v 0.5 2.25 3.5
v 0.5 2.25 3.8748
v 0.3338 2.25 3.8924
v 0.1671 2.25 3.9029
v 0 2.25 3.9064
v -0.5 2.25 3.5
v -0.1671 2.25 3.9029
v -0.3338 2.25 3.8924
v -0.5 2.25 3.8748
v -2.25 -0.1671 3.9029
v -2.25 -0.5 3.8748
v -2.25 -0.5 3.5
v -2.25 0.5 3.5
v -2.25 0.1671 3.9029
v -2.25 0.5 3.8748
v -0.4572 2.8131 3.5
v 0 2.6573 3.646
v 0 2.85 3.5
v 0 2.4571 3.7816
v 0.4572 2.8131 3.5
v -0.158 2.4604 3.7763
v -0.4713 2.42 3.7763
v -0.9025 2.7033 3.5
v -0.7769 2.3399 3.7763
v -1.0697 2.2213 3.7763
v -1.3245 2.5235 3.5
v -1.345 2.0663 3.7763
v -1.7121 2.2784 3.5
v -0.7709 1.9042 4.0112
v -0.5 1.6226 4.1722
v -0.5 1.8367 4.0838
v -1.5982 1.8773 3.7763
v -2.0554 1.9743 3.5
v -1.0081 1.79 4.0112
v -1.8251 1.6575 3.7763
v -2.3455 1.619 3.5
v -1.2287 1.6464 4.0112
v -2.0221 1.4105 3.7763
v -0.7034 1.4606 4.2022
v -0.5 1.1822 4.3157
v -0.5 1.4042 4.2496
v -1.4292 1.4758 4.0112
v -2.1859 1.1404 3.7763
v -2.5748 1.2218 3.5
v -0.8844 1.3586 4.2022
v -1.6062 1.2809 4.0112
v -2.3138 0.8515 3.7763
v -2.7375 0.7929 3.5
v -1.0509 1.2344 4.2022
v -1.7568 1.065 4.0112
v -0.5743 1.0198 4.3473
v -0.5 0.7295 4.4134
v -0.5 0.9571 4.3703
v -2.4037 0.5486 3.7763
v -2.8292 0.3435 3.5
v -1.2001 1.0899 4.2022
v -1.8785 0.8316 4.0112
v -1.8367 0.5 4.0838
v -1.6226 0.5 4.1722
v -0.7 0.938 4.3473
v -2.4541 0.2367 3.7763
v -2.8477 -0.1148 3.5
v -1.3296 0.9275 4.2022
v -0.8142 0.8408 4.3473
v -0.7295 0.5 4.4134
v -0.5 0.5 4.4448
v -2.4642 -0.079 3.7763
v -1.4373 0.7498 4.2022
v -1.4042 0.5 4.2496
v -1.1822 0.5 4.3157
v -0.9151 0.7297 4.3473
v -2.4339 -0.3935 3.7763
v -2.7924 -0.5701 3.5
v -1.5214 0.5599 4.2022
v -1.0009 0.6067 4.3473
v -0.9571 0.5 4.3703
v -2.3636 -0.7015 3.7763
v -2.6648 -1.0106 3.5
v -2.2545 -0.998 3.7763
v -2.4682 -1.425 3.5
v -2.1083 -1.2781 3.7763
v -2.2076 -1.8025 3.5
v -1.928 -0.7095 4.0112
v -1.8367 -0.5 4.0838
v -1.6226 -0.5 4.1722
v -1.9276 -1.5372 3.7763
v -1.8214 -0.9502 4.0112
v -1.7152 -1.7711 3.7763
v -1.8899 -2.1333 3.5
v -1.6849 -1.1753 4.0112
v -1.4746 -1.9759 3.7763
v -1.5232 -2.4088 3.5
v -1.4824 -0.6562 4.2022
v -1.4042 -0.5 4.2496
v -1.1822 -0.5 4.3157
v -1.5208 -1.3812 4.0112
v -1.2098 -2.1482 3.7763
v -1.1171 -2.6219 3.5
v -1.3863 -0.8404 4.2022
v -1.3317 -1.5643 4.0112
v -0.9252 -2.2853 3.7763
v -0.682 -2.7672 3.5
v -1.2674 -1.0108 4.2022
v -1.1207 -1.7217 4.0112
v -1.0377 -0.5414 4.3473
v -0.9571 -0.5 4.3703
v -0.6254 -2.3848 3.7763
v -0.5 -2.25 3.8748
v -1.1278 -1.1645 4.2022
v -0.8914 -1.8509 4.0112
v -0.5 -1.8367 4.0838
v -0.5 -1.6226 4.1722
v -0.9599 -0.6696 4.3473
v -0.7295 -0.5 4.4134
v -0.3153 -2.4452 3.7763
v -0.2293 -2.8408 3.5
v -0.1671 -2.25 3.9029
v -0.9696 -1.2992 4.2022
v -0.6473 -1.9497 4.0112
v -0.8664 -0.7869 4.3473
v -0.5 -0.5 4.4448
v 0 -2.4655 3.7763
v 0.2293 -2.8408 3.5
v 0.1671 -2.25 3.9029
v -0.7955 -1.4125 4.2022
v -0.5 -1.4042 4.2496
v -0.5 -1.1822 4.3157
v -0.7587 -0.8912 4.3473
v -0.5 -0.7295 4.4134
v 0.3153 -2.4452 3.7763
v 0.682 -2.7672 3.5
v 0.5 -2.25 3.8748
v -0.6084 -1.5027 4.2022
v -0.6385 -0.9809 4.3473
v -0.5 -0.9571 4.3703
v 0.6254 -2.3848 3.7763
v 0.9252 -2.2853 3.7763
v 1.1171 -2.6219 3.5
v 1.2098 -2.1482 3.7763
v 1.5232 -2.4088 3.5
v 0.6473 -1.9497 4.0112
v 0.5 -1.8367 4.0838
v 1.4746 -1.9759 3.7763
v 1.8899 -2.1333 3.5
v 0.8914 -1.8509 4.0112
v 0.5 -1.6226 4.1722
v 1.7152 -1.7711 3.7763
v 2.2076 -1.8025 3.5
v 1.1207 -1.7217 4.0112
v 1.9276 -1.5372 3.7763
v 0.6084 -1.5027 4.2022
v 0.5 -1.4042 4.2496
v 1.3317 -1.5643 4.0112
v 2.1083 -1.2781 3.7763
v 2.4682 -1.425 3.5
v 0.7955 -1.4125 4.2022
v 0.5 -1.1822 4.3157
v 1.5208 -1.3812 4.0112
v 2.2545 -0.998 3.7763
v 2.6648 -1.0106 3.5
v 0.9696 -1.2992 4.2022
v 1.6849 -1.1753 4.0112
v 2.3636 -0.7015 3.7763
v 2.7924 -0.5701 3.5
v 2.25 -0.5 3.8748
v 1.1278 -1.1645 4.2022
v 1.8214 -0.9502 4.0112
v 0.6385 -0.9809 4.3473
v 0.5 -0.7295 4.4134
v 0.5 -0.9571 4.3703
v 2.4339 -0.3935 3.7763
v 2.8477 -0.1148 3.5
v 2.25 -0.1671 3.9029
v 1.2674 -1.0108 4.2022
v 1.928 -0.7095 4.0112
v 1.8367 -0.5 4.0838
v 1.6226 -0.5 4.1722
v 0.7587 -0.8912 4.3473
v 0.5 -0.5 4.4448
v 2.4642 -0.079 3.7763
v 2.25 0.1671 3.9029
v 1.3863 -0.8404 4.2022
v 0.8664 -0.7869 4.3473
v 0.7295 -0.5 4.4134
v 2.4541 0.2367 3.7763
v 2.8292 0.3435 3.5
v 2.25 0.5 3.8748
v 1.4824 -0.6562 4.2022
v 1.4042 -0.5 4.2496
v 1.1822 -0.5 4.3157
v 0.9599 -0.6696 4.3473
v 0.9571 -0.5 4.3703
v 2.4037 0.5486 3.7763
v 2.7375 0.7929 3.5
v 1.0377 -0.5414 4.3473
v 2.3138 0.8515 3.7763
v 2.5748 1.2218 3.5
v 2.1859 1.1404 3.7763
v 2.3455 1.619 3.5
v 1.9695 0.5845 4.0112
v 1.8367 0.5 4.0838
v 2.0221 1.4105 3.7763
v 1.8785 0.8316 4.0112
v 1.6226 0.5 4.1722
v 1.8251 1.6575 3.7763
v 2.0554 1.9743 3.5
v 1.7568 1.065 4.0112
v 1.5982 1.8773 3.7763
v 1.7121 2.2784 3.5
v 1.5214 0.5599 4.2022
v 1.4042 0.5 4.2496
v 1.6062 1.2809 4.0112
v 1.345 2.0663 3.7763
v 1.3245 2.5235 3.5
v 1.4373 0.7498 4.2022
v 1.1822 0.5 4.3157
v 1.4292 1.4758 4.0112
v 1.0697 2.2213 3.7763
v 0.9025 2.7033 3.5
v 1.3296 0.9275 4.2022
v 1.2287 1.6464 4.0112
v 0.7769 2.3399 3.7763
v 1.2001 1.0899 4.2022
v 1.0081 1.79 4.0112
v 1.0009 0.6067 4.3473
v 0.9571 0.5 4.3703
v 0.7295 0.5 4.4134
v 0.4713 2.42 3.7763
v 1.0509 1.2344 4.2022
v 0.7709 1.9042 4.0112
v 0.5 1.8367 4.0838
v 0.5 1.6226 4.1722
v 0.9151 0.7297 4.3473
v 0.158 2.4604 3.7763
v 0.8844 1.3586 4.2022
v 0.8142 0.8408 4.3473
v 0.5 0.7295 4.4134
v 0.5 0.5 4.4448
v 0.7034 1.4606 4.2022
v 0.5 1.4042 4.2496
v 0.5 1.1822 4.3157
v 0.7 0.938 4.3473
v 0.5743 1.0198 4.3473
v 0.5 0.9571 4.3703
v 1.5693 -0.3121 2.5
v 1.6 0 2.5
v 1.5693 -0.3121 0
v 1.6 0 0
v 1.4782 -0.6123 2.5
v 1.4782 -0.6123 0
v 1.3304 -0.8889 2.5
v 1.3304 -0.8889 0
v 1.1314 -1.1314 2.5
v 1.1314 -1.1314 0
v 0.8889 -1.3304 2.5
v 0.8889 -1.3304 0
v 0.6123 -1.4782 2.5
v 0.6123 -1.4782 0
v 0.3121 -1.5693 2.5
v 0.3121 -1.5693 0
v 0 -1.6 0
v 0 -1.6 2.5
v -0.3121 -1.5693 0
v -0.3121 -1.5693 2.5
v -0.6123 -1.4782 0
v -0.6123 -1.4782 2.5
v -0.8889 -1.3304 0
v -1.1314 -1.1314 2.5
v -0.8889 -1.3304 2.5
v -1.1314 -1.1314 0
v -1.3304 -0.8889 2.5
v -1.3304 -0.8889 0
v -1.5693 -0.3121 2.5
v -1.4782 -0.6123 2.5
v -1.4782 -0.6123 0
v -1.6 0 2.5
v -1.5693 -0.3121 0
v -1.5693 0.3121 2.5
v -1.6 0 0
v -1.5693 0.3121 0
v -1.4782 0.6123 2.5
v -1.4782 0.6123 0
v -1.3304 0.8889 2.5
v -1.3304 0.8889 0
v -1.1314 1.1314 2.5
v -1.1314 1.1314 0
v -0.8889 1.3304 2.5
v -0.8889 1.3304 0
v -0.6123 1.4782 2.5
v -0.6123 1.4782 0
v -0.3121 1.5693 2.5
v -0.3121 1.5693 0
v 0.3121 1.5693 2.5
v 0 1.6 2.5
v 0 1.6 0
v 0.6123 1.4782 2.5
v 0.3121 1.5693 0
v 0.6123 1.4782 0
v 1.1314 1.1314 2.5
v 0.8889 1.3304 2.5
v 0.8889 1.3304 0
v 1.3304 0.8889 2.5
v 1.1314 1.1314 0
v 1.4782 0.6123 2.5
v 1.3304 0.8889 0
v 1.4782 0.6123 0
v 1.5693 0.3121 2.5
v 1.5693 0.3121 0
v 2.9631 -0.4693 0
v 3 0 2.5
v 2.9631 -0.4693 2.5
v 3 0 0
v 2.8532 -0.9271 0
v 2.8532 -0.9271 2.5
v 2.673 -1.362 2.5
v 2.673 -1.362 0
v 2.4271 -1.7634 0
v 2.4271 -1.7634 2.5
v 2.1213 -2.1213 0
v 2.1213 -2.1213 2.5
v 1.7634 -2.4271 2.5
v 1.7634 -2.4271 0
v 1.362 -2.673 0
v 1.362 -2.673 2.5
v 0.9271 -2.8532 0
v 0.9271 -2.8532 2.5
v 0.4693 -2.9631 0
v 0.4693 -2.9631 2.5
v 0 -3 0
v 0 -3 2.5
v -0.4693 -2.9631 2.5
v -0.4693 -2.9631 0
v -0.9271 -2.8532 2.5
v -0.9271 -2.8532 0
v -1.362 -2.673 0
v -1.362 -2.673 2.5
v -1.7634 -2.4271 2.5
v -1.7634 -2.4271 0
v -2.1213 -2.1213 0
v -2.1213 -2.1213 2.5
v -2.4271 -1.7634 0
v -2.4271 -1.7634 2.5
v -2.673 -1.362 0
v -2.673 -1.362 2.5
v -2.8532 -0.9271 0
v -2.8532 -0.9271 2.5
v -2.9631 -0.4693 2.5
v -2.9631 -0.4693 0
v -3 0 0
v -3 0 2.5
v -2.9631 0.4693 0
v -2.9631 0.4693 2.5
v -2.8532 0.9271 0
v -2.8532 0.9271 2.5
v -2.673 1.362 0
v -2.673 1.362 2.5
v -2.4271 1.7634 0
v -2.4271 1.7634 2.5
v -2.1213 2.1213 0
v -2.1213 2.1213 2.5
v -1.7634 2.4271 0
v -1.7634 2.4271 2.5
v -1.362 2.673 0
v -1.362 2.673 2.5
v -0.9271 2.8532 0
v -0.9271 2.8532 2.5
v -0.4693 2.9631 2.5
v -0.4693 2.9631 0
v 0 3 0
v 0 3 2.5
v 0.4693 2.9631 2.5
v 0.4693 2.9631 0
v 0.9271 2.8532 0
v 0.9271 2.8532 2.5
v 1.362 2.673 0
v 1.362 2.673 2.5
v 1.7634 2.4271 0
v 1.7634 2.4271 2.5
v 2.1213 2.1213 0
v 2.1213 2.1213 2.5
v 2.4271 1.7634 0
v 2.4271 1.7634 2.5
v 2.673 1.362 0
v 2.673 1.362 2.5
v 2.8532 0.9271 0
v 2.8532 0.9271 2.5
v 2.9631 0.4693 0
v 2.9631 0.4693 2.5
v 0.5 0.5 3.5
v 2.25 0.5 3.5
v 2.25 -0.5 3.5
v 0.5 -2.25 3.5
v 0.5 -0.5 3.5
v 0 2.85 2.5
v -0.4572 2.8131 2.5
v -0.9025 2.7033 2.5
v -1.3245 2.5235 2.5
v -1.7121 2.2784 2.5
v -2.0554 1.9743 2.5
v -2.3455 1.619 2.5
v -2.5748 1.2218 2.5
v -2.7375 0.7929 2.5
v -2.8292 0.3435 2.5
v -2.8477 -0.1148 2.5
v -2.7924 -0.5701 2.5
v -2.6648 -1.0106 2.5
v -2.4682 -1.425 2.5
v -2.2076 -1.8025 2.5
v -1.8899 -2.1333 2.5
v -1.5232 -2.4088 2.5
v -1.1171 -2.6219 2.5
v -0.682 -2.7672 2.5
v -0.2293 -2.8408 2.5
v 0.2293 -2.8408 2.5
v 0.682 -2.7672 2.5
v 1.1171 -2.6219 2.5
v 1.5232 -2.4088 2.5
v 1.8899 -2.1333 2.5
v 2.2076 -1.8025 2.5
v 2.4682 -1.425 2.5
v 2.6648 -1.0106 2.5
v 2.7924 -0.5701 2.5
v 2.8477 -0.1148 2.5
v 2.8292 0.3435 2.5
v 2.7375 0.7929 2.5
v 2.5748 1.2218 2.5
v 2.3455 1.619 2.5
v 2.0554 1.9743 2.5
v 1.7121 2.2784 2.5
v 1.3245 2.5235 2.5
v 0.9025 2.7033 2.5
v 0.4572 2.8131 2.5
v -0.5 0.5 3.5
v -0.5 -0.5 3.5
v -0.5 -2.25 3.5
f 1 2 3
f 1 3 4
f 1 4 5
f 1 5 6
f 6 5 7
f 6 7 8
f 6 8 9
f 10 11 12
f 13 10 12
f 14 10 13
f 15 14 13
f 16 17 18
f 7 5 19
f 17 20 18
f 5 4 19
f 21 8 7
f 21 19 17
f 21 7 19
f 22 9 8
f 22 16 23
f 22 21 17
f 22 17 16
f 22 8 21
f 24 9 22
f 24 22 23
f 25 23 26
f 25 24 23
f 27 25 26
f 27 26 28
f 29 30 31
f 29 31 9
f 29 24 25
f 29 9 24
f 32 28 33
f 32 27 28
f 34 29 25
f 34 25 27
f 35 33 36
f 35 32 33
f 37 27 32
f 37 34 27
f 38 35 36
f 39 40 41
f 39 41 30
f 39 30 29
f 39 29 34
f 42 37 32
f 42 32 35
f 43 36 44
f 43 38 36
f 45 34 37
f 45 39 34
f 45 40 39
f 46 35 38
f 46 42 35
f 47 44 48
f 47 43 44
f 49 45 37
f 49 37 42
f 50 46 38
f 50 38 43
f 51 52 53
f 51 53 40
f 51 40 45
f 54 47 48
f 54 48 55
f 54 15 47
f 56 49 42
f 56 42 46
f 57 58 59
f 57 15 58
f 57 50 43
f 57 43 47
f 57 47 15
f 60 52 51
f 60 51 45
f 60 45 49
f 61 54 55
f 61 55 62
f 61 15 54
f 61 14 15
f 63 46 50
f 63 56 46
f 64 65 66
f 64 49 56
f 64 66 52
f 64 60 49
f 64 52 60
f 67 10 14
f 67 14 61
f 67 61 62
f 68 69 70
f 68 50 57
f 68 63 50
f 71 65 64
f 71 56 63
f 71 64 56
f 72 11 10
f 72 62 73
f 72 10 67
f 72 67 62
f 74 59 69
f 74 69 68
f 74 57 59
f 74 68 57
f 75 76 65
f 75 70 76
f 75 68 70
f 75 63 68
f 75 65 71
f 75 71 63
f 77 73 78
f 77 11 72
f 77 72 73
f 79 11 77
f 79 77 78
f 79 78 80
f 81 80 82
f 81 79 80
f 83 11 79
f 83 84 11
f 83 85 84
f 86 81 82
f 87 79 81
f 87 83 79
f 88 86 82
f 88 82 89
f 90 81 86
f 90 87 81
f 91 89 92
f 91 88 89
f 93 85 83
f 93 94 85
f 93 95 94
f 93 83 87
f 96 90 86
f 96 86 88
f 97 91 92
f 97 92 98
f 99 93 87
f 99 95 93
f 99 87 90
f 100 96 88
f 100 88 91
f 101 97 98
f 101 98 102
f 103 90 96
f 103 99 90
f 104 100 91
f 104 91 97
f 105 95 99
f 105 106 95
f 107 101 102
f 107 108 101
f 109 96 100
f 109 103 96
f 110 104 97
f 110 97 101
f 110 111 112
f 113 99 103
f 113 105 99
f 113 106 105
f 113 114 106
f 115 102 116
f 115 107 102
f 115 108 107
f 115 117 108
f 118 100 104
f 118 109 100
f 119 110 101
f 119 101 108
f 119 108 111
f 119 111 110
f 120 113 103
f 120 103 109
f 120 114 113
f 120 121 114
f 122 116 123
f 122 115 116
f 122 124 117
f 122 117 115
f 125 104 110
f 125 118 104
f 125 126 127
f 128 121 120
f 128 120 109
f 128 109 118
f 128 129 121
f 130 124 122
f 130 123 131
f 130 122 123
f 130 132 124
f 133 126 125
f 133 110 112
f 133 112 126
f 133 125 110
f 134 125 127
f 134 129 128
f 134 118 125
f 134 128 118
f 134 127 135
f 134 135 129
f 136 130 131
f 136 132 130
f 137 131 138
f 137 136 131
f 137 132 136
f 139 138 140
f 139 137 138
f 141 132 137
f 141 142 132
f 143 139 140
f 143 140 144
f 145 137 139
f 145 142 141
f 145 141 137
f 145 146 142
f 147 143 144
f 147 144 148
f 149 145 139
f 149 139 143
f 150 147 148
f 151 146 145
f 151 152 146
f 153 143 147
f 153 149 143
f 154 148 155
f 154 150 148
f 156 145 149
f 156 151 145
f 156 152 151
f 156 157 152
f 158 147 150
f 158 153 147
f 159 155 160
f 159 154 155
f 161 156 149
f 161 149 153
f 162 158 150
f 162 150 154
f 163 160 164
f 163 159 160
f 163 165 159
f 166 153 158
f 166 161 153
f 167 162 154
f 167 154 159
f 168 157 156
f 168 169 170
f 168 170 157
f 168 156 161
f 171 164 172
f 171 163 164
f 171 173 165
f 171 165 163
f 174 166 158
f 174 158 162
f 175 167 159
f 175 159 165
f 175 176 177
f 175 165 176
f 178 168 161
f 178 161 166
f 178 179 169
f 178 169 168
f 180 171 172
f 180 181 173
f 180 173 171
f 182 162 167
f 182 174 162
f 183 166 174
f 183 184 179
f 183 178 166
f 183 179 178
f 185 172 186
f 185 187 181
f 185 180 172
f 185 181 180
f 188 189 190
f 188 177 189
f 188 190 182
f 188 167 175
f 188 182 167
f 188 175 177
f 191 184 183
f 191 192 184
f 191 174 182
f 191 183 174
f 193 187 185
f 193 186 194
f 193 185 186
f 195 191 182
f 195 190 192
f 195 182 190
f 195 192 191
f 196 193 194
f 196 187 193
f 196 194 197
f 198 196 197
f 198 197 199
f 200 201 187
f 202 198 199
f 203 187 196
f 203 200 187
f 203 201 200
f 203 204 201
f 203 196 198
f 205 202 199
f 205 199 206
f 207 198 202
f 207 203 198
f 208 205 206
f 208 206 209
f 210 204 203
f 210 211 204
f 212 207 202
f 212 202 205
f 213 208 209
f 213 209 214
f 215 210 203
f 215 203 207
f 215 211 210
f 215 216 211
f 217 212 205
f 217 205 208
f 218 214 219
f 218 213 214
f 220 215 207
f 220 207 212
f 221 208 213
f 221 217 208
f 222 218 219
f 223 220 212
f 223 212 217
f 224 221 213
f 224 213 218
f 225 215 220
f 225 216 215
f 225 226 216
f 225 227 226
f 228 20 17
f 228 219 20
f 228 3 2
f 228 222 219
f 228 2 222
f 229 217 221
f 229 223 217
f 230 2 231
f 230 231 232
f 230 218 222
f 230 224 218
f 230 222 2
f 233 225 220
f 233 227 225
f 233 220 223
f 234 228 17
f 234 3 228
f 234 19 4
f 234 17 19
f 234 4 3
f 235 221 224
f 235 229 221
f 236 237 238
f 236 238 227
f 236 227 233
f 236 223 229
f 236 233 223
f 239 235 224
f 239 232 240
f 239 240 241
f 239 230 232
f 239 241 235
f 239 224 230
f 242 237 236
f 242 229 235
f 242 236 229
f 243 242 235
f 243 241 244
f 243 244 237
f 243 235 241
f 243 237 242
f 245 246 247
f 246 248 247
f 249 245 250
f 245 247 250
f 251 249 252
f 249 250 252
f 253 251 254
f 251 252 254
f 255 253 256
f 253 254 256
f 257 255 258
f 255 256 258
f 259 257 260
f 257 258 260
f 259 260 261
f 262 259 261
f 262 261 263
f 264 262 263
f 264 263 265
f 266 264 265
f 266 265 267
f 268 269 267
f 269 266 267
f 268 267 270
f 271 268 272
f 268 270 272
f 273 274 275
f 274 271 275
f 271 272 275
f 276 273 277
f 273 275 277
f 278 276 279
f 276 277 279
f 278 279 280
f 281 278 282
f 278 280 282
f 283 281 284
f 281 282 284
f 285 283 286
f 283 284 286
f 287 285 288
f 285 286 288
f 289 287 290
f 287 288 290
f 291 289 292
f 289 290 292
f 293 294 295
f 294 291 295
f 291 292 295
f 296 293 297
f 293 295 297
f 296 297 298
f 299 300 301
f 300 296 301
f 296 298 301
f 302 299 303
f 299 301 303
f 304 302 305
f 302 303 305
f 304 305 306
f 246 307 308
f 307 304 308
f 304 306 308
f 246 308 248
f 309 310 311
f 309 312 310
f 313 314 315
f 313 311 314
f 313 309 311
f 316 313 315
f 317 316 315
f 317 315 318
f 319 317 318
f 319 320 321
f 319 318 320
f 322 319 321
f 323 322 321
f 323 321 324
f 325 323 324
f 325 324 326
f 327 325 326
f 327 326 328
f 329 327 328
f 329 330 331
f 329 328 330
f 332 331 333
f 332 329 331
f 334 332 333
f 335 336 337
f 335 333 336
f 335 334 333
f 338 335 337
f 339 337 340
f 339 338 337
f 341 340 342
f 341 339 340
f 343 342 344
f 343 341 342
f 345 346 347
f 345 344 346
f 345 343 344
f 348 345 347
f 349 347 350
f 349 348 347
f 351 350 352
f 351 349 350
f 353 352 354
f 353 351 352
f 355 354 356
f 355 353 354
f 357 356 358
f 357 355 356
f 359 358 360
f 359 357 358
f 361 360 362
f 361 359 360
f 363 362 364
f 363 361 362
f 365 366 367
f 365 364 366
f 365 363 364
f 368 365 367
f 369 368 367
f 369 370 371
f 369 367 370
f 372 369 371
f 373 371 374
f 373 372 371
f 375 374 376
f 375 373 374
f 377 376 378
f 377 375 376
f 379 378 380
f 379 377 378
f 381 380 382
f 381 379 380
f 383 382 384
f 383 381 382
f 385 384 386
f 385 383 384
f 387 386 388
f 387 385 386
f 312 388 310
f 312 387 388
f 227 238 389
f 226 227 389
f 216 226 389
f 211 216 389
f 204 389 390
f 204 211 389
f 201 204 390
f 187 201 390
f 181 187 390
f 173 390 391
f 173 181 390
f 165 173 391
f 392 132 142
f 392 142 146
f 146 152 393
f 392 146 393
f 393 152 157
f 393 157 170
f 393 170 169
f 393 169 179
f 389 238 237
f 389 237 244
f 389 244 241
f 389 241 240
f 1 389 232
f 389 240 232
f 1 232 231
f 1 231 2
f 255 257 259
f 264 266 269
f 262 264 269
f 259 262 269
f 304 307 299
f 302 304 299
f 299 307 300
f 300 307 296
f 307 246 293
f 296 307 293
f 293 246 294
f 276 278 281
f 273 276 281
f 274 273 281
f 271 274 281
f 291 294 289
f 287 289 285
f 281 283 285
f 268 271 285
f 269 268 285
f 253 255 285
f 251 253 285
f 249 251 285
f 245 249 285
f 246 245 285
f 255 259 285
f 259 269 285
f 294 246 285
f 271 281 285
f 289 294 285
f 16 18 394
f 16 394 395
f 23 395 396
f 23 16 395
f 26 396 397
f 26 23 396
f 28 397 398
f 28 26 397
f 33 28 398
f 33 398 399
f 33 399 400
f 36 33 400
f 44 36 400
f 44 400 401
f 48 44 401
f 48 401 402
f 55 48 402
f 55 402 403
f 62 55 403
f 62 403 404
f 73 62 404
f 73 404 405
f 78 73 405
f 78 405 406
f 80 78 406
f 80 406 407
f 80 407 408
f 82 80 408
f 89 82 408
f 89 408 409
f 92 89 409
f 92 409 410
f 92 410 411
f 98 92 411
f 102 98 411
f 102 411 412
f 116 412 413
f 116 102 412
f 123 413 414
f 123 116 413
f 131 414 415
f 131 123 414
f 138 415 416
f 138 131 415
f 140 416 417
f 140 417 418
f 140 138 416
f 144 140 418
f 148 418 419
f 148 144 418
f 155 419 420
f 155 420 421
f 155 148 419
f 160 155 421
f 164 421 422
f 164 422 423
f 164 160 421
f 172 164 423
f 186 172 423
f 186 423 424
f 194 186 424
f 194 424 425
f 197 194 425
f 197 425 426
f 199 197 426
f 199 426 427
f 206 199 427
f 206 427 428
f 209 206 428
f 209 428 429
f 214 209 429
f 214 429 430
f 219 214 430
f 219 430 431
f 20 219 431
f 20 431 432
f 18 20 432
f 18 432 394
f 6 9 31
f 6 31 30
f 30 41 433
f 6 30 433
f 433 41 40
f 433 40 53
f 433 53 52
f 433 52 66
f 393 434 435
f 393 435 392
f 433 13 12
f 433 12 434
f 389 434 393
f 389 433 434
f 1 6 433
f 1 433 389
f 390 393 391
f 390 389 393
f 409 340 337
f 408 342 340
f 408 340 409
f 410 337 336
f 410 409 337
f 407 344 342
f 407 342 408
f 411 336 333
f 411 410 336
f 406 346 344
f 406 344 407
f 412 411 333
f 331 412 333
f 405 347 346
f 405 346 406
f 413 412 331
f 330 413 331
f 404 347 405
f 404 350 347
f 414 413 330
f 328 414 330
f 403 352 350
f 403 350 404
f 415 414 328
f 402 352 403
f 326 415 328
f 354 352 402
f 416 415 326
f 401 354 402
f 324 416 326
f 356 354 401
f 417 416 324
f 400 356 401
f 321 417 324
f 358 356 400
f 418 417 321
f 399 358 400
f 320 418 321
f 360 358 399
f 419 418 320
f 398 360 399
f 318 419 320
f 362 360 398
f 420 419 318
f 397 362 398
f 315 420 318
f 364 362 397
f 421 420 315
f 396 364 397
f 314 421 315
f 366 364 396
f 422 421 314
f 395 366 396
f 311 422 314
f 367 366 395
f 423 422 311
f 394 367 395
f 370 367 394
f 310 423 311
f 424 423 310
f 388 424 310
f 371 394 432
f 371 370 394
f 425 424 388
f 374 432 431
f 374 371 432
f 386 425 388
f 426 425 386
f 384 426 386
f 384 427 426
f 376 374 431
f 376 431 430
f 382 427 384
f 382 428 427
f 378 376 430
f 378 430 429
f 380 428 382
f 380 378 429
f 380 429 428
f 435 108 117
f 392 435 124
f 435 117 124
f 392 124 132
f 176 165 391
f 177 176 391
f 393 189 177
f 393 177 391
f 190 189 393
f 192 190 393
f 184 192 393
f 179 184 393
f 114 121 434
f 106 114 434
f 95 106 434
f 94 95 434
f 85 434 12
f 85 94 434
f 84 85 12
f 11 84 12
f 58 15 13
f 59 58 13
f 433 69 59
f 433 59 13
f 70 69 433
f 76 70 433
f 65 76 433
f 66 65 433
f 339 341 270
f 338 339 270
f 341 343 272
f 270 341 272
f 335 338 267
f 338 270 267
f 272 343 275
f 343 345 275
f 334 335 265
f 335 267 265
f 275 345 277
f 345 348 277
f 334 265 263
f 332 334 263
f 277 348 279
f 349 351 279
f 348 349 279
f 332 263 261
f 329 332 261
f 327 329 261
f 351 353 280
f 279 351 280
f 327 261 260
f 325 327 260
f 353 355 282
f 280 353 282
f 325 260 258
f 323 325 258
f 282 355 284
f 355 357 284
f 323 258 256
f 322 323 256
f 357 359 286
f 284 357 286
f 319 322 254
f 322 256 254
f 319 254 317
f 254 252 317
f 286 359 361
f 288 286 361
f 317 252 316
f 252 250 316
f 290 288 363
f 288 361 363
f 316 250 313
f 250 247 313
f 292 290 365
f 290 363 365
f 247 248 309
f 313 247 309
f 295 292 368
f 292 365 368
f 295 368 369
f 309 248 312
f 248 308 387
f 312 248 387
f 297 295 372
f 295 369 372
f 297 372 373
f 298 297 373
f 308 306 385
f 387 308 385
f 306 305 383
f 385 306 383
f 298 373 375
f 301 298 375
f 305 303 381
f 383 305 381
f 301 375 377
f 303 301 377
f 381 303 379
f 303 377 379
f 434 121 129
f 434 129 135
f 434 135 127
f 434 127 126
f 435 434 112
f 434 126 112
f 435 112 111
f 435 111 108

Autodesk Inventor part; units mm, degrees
ref_plane "YZ Plane" through (0, 0, 0) normal (1, 0, 0) x (0, 1, 0)
ref_plane "XZ Plane" through (0, 0, 0) normal (0, 1, 0) x (-1, 0, 0)
sketch "スケッチ1" plane through (0, 0, 0) normal (0, 0, 1) x (1, 0, 0)
  circle A0 centre (0, 0) radius 1.6
  circle A1 centre (0, 0) radius 3
  dimension "d0" = 3.2
  dimension "d1" = 6
extrude "押し出し1" add sketch "スケッチ1" along normal blind 2.5
sketch "スケッチ2" plane through (0, 0, 0) normal (1, 0, 0) x (0, 1, 0)
  arc A0 (2.85, 3.5) -> (-2.85, 3.5) centre (0, -0.0613) ccw
  line L0 (2.85, 3.5) -> (-2.85, 3.5)
  line L1 (-2.85, 3.5) -> (-2.85, 2.5)
  line L2 (-2.85, 2.5) -> (2.85, 2.5)
  line L3 (2.85, 2.5) -> (2.85, 3.5)
  line L4 (3, 2.5) -> (-3, 2.5) projected
  line L5 (10, 4.5) -> (-10, 4.5)
  line L6 (0, 2.5) -> (0, 4.5)
  point P0 (0, 0)
  point P1 (0, 4.5)
  dimension "d4" = 1
  dimension "d5" = 1
  dimension "d7" = 5.7
revolve "回転1" add sketch "スケッチ2" angle 360 about axis through (0, 0, 2.5) along (0, 0, 1) picked at (1.6112, 3.682) contours L0 L6 A0 | L3 L2 L6 L0
ref_plane "作業平面1" through (0, 0, 4.5) normal (0, 0, 1) x (1, 0, 0)
sketch "スケッチ3" plane through (0, 0, 4.5) normal (0, 0, 1) x (1, 0, 0)
  line L0 (2.25, -0.5) -> (-2.25, -0.5)
  line L1 (-2.25, -0.5) -> (-2.25, 0.5)
  line L2 (-2.25, 0.5) -> (2.25, 0.5)
  line L3 (2.25, 0.5) -> (2.25, -0.5)
  line L4 (2.25, -0.5) -> (-2.25, 0.5) construction
  line L5 (-2.25, -0.5) -> (2.25, 0.5) construction
  line L6 (-0.5, -2.25) -> (0.5, -2.25)
  line L7 (0.5, -2.25) -> (0.5, 2.25)
  line L8 (0.5, 2.25) -> (-0.5, 2.25)
  line L9 (-0.5, 2.25) -> (-0.5, -2.25)
  line L10 (-0.5, -2.25) -> (0.5, 2.25) construction
  line L11 (0.5, -2.25) -> (-0.5, 2.25) construction
  point P0 (0, 0)
  point P1 (-0.5, 0.5)
  point P2 (-0.5, -0.5)
  point P3 (0.5, -0.5)
  point P4 (0.5, 0.5)
  dimension "d9" = 4.5
  dimension "d10" = 1
extrude "押し出し2" cut sketch "スケッチ3" against normal blind 1
properties part number "bearing_3_6_2.5" material "アルミニウム 6061"
